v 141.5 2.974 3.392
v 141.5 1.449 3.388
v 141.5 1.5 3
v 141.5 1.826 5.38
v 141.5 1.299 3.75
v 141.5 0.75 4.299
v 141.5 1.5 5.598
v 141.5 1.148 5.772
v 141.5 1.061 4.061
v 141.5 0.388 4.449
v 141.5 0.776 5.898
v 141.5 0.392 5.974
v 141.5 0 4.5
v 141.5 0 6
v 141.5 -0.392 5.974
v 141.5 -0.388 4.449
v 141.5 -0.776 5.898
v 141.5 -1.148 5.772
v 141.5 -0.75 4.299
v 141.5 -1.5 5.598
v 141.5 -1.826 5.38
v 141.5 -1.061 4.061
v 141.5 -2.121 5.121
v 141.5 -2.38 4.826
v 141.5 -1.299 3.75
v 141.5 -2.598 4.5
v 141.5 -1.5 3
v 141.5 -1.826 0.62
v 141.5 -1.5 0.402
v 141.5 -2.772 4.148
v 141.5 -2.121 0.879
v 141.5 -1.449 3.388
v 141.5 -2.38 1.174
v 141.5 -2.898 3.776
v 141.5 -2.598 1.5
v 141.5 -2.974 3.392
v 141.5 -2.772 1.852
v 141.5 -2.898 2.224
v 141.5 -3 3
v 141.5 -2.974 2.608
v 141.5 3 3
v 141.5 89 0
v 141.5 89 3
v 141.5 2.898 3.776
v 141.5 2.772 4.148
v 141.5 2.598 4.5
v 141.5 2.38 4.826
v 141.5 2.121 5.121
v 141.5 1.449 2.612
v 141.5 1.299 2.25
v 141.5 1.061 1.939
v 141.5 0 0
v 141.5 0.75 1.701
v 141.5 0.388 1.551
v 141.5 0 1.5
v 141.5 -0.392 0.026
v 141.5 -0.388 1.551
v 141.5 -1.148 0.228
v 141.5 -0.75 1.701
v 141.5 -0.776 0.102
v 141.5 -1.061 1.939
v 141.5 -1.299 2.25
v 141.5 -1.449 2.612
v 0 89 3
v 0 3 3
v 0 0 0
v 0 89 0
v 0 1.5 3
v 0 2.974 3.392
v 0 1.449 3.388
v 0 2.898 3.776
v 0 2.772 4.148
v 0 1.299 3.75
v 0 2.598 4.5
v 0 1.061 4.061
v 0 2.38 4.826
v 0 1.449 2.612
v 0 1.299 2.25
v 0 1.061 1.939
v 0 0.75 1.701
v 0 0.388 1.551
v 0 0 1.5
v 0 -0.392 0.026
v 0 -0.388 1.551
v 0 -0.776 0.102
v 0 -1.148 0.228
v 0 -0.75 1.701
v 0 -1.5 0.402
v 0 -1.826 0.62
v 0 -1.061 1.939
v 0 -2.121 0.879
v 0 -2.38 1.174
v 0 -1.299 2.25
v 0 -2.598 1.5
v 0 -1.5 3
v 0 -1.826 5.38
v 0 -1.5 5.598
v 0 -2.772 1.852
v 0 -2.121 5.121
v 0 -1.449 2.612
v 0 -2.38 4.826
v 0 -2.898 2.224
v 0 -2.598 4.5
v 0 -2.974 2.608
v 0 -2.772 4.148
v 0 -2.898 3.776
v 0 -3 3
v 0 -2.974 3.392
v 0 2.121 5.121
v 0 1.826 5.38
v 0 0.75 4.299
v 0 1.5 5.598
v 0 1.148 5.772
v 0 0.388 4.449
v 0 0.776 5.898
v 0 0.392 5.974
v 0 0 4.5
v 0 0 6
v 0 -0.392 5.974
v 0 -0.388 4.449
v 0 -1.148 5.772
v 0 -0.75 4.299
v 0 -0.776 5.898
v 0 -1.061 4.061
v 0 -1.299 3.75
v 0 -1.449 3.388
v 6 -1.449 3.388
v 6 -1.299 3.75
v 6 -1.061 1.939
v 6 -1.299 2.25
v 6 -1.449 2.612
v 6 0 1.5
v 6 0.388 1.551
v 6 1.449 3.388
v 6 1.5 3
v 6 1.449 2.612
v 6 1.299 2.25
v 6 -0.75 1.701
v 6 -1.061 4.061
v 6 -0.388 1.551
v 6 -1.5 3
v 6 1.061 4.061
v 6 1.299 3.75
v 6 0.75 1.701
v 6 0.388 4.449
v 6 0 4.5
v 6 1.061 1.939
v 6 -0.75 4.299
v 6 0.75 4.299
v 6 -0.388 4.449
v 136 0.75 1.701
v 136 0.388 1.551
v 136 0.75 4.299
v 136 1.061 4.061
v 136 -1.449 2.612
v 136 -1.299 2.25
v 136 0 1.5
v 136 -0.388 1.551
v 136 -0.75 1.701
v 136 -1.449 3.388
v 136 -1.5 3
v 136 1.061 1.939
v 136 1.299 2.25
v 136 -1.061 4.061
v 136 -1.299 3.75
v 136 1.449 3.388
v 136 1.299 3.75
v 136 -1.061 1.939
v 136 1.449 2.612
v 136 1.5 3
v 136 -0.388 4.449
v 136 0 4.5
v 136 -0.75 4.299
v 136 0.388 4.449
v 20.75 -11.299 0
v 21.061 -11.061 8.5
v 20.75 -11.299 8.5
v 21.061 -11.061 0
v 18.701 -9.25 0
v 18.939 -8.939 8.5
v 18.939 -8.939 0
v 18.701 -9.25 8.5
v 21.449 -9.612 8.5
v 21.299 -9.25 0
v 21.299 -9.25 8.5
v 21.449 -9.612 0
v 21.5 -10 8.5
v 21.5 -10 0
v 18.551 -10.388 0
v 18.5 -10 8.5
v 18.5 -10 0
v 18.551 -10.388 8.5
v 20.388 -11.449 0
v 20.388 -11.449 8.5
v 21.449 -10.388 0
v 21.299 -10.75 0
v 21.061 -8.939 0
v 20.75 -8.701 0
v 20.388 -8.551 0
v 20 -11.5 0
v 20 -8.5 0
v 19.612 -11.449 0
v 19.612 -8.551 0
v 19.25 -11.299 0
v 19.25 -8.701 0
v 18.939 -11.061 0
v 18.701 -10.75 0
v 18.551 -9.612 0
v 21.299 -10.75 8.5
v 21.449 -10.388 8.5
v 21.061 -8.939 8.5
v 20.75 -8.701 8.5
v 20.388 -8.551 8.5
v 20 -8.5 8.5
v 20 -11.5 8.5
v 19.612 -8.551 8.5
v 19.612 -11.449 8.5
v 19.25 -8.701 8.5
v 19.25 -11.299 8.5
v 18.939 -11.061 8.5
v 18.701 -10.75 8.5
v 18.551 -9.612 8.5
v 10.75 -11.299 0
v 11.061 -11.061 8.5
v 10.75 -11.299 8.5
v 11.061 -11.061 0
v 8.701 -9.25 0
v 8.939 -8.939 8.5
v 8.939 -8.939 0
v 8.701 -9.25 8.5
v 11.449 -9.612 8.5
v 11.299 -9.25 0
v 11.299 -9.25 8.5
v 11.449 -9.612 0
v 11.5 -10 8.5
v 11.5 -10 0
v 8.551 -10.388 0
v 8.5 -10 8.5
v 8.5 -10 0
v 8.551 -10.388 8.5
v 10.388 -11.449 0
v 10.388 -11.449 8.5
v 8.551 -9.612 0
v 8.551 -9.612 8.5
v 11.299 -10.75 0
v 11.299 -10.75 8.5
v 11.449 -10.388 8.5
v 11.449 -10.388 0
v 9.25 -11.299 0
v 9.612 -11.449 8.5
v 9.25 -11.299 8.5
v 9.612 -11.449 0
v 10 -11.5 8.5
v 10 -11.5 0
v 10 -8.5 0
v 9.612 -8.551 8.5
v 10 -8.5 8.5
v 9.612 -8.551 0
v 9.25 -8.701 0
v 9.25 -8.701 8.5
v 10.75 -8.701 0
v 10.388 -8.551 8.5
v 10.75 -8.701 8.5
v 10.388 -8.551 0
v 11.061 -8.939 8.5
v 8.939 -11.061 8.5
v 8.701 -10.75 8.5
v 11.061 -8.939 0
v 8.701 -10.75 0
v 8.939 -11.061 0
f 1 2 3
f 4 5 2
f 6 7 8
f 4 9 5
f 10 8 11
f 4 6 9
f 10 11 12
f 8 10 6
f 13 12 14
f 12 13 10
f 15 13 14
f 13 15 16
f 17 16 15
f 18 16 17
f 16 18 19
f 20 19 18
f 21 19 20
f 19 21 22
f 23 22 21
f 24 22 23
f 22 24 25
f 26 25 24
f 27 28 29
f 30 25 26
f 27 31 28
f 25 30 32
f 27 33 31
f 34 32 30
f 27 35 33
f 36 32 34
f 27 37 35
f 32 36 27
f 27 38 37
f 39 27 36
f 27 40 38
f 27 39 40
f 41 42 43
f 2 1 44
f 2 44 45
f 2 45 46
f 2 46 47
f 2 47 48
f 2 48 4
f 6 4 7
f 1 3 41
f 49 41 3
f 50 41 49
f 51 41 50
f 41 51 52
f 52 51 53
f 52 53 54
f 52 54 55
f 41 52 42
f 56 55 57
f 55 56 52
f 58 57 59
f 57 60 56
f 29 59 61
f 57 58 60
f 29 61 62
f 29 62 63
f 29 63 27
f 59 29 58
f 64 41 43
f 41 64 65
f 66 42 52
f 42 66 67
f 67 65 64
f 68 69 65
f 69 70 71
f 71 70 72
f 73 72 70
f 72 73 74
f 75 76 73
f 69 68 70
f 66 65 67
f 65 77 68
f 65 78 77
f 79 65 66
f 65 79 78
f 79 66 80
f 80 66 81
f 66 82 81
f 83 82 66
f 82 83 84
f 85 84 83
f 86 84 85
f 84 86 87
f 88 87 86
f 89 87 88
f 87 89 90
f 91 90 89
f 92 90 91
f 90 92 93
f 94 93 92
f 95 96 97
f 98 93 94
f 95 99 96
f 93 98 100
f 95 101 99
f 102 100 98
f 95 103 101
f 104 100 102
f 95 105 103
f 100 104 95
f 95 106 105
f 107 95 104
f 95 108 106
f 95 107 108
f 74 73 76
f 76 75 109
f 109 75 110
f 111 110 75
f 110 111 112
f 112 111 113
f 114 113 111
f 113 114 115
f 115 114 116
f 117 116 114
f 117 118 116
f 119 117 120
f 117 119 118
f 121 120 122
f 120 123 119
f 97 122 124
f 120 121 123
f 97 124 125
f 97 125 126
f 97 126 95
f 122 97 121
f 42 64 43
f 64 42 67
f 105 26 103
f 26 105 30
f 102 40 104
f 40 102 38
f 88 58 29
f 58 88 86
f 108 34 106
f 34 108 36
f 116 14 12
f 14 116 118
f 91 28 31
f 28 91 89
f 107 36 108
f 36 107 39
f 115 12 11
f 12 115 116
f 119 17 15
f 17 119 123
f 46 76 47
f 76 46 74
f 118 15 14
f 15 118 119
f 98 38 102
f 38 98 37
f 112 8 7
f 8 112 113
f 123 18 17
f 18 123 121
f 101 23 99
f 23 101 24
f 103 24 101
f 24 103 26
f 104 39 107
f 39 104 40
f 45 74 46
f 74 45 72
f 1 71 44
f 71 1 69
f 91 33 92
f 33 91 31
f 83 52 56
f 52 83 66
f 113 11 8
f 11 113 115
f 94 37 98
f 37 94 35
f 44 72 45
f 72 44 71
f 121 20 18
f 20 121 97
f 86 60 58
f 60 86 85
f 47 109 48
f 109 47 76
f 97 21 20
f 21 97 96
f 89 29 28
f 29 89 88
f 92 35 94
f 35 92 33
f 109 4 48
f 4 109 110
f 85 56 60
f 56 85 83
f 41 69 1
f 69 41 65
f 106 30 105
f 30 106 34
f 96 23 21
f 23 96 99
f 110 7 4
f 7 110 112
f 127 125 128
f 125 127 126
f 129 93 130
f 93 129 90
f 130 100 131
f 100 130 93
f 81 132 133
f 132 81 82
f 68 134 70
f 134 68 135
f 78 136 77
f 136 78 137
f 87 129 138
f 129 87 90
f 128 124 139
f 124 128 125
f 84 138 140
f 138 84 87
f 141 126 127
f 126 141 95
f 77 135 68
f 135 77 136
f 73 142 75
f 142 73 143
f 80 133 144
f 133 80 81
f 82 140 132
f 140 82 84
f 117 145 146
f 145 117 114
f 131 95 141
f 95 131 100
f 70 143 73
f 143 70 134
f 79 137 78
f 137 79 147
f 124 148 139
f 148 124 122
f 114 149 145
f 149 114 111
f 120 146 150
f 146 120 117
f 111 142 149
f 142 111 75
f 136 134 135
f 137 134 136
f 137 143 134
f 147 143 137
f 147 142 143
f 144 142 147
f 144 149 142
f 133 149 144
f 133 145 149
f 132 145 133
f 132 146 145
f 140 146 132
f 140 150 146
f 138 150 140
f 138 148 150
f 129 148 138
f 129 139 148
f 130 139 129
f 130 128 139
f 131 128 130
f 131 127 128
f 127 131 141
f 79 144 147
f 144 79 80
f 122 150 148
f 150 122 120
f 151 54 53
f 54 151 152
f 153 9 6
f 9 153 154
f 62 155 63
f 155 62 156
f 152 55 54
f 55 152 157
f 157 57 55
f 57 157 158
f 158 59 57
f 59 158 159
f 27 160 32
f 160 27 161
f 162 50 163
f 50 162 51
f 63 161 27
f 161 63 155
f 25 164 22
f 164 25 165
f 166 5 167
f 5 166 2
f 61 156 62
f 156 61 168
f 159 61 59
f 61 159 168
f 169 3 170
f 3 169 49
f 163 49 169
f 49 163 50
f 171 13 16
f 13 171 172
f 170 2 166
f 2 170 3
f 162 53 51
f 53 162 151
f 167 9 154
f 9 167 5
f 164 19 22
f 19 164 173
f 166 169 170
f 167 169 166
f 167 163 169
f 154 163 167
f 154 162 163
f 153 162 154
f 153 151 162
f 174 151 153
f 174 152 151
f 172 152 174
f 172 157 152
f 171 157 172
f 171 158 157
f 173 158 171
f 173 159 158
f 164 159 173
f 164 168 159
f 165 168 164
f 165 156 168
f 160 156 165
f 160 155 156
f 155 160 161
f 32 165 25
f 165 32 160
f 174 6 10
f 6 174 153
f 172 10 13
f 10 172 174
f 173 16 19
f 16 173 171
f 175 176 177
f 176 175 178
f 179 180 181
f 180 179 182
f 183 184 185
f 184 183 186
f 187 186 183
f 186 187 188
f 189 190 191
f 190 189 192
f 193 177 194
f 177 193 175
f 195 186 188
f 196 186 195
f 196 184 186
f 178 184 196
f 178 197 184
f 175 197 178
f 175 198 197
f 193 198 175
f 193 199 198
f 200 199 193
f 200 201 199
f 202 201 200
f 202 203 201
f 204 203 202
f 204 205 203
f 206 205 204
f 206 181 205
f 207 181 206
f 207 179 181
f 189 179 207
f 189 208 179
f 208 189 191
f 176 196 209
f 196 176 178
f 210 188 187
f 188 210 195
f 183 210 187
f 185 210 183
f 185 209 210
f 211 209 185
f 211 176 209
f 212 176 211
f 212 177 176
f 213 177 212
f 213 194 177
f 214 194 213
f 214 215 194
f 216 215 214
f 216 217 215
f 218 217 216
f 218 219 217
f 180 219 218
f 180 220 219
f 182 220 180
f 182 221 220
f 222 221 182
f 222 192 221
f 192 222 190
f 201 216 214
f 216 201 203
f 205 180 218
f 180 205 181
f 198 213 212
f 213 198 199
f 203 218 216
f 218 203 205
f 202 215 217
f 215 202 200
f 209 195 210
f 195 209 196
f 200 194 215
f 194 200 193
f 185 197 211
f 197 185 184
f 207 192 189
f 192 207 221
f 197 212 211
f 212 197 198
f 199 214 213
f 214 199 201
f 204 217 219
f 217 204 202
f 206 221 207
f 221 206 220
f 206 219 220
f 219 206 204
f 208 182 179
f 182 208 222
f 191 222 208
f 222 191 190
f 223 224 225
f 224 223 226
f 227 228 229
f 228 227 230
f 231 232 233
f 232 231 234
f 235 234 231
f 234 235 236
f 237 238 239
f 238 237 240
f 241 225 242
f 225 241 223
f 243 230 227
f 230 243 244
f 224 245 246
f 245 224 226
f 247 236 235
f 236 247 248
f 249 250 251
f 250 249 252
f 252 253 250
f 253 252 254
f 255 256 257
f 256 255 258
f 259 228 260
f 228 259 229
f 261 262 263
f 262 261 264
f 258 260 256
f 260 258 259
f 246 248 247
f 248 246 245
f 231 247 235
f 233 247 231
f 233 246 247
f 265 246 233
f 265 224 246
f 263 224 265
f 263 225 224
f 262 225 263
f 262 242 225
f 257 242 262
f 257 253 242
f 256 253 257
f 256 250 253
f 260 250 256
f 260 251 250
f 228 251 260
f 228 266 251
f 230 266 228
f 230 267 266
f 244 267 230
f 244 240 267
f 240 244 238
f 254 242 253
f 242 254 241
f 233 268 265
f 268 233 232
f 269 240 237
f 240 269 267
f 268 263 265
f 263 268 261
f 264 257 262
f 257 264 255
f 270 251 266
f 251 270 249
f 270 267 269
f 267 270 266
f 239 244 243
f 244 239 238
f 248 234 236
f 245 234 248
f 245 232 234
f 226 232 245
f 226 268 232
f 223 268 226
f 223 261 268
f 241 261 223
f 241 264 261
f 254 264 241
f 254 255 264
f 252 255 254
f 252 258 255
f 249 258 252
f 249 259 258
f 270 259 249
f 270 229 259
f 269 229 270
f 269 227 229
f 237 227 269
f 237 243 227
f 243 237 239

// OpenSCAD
hinge_radius = 4;
hinge_diameter = 2 * hinge_radius;
wall_thickness = 3;
full_width = 26+52+(2*wall_thickness) + hinge_diameter;
full_length = 26+26+26+55+(5*wall_thickness);
interior_height = 35;
full_height = interior_height + wall_thickness + hinge_diameter;

width = full_length - (2 * wall_thickness);
length = full_width - 5;

difference() {
union(){
cube([width - 0.5, length+2, 3]);
translate([0,0,3]) rotate([0,90,0]) cylinder(h=width - 0.5, r=3);
}
translate([0,0,3]) rotate([0,90,0]) cylinder(h=6, r=1.5);
translate([width-6,0, 3]) rotate([0,90,0]) cylinder(h=6, r=1.5);
}

translate([20, -10, 0]) cylinder(h=8.5, r=1.5);
translate([10, -10, 0]) cylinder(h=8.5, r=1.5);

$fa = 1;
$fs = 0.4;
